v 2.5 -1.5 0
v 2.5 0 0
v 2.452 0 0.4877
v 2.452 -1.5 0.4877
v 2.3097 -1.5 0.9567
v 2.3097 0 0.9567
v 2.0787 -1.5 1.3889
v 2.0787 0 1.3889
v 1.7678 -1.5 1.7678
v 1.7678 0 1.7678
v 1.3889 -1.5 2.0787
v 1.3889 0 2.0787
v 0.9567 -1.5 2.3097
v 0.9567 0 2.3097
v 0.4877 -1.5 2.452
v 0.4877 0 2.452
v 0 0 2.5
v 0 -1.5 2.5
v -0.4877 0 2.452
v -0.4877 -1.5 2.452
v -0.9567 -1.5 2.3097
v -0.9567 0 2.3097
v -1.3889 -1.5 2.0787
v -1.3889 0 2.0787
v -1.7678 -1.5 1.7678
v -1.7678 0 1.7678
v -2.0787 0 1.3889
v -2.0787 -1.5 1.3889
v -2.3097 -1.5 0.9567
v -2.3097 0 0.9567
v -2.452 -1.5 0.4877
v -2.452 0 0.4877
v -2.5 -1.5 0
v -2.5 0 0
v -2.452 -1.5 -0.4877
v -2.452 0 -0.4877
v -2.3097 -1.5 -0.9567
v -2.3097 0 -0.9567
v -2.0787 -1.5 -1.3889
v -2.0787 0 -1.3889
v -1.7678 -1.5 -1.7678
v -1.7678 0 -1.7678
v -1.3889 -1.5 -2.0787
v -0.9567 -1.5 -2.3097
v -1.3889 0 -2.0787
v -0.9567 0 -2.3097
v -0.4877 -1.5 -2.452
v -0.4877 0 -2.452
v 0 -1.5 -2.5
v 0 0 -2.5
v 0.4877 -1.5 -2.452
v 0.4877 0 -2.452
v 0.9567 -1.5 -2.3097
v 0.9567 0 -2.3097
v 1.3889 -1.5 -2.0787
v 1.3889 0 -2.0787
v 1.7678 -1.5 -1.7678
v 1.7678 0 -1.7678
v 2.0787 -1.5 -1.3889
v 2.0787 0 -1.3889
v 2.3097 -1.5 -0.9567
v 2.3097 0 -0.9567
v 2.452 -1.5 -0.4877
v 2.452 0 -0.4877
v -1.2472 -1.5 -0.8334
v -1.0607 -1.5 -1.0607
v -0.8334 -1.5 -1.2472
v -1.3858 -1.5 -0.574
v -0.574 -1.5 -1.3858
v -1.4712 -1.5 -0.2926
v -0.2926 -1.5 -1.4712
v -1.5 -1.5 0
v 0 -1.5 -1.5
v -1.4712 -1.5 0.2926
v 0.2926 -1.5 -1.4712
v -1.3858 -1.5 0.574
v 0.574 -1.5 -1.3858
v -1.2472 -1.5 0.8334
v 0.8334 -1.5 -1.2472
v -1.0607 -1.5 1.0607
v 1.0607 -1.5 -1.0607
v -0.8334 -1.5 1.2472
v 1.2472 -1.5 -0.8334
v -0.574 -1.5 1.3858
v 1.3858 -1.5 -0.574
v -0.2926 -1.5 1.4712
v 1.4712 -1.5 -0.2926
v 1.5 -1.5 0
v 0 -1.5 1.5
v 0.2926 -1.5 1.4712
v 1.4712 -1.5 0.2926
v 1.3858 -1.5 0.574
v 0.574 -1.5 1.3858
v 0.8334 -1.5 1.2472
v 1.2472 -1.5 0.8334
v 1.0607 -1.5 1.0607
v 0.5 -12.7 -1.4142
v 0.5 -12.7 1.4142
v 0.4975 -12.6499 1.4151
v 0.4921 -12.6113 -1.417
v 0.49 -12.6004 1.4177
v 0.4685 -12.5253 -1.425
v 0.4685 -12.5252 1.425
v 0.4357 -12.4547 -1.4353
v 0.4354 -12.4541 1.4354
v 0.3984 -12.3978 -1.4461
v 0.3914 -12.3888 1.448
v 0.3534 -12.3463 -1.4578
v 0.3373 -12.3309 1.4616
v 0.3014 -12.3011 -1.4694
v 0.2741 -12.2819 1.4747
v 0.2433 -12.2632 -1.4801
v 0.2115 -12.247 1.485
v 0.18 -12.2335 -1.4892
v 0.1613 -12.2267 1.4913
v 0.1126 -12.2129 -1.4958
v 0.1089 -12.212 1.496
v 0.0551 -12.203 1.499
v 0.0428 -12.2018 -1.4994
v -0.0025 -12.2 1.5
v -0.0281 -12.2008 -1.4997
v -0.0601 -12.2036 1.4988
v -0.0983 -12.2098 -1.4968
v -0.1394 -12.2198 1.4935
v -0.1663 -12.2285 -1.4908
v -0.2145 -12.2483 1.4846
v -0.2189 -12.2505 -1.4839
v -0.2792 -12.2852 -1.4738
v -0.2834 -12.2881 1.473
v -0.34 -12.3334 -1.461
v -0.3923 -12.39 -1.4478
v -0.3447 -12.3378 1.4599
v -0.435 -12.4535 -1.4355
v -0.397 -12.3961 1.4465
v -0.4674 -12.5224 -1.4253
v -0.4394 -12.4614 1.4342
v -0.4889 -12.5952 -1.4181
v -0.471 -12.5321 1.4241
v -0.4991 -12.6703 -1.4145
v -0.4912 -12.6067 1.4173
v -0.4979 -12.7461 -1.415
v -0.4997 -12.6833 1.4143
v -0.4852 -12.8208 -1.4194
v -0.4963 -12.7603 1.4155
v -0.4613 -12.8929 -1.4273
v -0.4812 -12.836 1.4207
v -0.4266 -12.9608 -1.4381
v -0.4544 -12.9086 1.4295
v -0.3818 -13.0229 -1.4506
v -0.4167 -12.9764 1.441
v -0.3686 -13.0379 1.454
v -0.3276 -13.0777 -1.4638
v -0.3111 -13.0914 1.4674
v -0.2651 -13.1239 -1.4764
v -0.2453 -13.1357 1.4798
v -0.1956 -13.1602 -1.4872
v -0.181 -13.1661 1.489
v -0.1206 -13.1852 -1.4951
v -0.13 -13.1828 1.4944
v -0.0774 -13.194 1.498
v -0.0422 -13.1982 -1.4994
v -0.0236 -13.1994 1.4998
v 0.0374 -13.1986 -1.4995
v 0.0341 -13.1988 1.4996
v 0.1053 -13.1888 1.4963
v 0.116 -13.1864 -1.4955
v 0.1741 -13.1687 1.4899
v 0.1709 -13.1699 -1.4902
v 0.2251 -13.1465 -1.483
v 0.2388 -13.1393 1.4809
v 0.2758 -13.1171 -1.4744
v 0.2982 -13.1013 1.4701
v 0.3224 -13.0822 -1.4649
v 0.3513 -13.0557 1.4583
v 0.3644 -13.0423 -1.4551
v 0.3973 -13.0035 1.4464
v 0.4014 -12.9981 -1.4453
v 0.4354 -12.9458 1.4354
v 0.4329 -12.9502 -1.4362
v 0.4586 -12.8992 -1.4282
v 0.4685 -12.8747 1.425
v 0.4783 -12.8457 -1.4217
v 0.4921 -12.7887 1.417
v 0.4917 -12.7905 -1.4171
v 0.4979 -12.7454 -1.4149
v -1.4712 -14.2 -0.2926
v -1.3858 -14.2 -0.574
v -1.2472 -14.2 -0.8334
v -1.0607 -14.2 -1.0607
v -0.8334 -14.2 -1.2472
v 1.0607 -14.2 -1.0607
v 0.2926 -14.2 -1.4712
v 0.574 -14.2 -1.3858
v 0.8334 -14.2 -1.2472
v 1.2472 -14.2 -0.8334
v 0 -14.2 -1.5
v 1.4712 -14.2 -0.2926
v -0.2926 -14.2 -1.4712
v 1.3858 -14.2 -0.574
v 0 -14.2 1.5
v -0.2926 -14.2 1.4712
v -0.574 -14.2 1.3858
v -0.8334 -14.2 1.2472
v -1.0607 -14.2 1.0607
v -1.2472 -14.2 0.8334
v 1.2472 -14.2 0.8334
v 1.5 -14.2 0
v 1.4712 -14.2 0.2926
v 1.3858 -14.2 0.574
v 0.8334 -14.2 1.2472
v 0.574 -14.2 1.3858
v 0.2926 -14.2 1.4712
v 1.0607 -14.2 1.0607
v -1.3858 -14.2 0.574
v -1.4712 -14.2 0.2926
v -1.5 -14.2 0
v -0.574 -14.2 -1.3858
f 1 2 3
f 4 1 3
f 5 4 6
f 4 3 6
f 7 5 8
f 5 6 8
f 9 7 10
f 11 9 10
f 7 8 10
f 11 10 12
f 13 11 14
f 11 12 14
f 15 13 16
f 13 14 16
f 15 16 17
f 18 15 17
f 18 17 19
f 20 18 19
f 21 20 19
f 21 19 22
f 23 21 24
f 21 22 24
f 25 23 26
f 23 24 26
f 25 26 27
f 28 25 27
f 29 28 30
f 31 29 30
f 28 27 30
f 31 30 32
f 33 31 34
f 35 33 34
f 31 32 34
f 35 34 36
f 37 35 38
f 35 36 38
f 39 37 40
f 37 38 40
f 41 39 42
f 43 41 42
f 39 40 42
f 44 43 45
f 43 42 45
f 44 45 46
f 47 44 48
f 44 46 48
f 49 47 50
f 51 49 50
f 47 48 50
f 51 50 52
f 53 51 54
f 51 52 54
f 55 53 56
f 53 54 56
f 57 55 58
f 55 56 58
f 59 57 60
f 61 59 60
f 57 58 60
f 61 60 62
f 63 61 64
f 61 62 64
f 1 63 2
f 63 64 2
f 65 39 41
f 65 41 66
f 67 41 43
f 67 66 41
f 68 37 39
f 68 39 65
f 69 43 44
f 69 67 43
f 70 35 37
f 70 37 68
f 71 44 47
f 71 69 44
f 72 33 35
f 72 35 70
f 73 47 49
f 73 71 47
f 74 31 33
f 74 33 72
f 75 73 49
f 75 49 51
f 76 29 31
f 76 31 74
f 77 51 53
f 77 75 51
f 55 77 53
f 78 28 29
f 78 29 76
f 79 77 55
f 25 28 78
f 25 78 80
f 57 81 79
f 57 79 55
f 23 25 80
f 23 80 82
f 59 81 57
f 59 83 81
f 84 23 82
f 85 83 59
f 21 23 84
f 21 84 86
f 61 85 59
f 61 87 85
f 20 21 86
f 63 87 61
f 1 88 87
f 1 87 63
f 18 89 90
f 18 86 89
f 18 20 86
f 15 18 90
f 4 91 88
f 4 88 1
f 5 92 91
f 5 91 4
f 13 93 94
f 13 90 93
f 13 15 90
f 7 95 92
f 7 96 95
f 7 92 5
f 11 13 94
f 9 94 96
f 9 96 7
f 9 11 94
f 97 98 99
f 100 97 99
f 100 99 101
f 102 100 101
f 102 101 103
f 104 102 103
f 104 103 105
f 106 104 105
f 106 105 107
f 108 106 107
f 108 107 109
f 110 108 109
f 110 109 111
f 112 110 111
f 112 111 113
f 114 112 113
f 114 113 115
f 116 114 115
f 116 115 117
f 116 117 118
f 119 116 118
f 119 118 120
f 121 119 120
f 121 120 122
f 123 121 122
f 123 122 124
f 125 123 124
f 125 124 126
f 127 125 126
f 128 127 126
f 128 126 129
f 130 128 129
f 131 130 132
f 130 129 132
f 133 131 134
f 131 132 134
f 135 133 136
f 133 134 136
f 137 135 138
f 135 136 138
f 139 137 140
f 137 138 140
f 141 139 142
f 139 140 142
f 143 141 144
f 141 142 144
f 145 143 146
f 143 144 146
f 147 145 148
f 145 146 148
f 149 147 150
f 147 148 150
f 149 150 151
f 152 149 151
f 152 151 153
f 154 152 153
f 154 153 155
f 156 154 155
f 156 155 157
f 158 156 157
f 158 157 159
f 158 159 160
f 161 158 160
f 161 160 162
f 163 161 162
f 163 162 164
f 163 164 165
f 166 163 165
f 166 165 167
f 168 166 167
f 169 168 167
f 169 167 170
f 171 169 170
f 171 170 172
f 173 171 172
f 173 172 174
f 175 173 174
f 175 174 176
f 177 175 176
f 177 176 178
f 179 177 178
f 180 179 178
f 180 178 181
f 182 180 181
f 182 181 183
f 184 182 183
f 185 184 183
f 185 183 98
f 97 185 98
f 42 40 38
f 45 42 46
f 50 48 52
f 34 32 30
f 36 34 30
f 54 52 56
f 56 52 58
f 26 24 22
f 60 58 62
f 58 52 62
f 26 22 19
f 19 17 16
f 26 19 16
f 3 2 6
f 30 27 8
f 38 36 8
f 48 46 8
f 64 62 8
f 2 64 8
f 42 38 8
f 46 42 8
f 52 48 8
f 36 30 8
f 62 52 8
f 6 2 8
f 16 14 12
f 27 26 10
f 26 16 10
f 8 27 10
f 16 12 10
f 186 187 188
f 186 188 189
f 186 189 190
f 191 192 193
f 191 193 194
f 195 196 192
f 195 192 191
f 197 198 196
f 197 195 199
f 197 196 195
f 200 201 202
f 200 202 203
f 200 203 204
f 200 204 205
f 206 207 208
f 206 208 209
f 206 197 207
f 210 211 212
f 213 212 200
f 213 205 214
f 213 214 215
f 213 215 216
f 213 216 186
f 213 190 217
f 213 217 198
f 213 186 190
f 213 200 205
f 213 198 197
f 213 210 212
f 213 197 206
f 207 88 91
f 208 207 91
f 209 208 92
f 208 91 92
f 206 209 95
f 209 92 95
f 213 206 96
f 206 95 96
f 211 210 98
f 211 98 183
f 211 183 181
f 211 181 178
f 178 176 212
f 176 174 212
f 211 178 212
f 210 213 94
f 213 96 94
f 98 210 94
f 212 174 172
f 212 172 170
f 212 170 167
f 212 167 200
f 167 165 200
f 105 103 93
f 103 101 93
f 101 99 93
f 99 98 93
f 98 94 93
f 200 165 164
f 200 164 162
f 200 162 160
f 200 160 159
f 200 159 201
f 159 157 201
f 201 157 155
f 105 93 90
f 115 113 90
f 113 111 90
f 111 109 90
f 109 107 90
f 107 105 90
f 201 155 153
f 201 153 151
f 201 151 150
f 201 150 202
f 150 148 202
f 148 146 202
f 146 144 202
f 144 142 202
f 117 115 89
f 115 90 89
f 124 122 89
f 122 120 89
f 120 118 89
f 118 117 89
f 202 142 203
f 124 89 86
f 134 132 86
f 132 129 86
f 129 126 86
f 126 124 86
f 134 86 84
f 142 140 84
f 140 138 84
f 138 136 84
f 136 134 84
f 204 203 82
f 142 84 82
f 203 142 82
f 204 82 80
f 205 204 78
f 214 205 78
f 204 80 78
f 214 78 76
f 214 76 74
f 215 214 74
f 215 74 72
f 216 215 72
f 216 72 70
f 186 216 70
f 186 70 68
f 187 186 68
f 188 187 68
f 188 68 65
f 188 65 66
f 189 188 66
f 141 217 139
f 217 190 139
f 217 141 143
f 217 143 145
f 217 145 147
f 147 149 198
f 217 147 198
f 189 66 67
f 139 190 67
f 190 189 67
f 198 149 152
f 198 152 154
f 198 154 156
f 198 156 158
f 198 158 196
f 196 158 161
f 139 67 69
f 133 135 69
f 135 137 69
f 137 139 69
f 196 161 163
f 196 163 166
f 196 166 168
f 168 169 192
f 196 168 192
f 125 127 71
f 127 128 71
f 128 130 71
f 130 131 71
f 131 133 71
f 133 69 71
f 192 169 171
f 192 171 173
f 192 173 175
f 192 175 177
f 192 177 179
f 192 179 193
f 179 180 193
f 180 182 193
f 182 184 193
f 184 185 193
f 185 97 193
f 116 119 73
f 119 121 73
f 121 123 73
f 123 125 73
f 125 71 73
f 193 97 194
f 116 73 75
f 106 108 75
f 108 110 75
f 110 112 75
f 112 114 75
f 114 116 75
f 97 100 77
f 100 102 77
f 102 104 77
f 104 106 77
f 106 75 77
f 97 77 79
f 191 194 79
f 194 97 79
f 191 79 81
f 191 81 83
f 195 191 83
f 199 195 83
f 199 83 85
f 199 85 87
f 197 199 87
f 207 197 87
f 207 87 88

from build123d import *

# Parameters (mm, degrees)
F0_R     = 2.5
F1_DEPTH = 1.5
F2_R     = 1.5
F3_DEPTH = 12.7
F5_R     = 0.5
F6_DEPTH = 4.001


with BuildPart() as f1:
    # F0 (on Front) → F1 (new body)
    with BuildSketch(Plane.XZ):
        Circle(F0_R)
    extrude(amount=F1_DEPTH)

    # F2 (on face) → F3 (join)
    with BuildSketch(Plane.XZ.offset(1.5)):
        Circle(F2_R)
    extrude(amount=F3_DEPTH)

    # F5 (on offset) → F6 (cut, through all)
    with BuildSketch(Plane.XY.offset(1.5)):
        with Locations((0, -12.7)):
            Circle(F5_R)
    extrude(amount=-F6_DEPTH, mode=Mode.SUBTRACT)


solid = f1.part
